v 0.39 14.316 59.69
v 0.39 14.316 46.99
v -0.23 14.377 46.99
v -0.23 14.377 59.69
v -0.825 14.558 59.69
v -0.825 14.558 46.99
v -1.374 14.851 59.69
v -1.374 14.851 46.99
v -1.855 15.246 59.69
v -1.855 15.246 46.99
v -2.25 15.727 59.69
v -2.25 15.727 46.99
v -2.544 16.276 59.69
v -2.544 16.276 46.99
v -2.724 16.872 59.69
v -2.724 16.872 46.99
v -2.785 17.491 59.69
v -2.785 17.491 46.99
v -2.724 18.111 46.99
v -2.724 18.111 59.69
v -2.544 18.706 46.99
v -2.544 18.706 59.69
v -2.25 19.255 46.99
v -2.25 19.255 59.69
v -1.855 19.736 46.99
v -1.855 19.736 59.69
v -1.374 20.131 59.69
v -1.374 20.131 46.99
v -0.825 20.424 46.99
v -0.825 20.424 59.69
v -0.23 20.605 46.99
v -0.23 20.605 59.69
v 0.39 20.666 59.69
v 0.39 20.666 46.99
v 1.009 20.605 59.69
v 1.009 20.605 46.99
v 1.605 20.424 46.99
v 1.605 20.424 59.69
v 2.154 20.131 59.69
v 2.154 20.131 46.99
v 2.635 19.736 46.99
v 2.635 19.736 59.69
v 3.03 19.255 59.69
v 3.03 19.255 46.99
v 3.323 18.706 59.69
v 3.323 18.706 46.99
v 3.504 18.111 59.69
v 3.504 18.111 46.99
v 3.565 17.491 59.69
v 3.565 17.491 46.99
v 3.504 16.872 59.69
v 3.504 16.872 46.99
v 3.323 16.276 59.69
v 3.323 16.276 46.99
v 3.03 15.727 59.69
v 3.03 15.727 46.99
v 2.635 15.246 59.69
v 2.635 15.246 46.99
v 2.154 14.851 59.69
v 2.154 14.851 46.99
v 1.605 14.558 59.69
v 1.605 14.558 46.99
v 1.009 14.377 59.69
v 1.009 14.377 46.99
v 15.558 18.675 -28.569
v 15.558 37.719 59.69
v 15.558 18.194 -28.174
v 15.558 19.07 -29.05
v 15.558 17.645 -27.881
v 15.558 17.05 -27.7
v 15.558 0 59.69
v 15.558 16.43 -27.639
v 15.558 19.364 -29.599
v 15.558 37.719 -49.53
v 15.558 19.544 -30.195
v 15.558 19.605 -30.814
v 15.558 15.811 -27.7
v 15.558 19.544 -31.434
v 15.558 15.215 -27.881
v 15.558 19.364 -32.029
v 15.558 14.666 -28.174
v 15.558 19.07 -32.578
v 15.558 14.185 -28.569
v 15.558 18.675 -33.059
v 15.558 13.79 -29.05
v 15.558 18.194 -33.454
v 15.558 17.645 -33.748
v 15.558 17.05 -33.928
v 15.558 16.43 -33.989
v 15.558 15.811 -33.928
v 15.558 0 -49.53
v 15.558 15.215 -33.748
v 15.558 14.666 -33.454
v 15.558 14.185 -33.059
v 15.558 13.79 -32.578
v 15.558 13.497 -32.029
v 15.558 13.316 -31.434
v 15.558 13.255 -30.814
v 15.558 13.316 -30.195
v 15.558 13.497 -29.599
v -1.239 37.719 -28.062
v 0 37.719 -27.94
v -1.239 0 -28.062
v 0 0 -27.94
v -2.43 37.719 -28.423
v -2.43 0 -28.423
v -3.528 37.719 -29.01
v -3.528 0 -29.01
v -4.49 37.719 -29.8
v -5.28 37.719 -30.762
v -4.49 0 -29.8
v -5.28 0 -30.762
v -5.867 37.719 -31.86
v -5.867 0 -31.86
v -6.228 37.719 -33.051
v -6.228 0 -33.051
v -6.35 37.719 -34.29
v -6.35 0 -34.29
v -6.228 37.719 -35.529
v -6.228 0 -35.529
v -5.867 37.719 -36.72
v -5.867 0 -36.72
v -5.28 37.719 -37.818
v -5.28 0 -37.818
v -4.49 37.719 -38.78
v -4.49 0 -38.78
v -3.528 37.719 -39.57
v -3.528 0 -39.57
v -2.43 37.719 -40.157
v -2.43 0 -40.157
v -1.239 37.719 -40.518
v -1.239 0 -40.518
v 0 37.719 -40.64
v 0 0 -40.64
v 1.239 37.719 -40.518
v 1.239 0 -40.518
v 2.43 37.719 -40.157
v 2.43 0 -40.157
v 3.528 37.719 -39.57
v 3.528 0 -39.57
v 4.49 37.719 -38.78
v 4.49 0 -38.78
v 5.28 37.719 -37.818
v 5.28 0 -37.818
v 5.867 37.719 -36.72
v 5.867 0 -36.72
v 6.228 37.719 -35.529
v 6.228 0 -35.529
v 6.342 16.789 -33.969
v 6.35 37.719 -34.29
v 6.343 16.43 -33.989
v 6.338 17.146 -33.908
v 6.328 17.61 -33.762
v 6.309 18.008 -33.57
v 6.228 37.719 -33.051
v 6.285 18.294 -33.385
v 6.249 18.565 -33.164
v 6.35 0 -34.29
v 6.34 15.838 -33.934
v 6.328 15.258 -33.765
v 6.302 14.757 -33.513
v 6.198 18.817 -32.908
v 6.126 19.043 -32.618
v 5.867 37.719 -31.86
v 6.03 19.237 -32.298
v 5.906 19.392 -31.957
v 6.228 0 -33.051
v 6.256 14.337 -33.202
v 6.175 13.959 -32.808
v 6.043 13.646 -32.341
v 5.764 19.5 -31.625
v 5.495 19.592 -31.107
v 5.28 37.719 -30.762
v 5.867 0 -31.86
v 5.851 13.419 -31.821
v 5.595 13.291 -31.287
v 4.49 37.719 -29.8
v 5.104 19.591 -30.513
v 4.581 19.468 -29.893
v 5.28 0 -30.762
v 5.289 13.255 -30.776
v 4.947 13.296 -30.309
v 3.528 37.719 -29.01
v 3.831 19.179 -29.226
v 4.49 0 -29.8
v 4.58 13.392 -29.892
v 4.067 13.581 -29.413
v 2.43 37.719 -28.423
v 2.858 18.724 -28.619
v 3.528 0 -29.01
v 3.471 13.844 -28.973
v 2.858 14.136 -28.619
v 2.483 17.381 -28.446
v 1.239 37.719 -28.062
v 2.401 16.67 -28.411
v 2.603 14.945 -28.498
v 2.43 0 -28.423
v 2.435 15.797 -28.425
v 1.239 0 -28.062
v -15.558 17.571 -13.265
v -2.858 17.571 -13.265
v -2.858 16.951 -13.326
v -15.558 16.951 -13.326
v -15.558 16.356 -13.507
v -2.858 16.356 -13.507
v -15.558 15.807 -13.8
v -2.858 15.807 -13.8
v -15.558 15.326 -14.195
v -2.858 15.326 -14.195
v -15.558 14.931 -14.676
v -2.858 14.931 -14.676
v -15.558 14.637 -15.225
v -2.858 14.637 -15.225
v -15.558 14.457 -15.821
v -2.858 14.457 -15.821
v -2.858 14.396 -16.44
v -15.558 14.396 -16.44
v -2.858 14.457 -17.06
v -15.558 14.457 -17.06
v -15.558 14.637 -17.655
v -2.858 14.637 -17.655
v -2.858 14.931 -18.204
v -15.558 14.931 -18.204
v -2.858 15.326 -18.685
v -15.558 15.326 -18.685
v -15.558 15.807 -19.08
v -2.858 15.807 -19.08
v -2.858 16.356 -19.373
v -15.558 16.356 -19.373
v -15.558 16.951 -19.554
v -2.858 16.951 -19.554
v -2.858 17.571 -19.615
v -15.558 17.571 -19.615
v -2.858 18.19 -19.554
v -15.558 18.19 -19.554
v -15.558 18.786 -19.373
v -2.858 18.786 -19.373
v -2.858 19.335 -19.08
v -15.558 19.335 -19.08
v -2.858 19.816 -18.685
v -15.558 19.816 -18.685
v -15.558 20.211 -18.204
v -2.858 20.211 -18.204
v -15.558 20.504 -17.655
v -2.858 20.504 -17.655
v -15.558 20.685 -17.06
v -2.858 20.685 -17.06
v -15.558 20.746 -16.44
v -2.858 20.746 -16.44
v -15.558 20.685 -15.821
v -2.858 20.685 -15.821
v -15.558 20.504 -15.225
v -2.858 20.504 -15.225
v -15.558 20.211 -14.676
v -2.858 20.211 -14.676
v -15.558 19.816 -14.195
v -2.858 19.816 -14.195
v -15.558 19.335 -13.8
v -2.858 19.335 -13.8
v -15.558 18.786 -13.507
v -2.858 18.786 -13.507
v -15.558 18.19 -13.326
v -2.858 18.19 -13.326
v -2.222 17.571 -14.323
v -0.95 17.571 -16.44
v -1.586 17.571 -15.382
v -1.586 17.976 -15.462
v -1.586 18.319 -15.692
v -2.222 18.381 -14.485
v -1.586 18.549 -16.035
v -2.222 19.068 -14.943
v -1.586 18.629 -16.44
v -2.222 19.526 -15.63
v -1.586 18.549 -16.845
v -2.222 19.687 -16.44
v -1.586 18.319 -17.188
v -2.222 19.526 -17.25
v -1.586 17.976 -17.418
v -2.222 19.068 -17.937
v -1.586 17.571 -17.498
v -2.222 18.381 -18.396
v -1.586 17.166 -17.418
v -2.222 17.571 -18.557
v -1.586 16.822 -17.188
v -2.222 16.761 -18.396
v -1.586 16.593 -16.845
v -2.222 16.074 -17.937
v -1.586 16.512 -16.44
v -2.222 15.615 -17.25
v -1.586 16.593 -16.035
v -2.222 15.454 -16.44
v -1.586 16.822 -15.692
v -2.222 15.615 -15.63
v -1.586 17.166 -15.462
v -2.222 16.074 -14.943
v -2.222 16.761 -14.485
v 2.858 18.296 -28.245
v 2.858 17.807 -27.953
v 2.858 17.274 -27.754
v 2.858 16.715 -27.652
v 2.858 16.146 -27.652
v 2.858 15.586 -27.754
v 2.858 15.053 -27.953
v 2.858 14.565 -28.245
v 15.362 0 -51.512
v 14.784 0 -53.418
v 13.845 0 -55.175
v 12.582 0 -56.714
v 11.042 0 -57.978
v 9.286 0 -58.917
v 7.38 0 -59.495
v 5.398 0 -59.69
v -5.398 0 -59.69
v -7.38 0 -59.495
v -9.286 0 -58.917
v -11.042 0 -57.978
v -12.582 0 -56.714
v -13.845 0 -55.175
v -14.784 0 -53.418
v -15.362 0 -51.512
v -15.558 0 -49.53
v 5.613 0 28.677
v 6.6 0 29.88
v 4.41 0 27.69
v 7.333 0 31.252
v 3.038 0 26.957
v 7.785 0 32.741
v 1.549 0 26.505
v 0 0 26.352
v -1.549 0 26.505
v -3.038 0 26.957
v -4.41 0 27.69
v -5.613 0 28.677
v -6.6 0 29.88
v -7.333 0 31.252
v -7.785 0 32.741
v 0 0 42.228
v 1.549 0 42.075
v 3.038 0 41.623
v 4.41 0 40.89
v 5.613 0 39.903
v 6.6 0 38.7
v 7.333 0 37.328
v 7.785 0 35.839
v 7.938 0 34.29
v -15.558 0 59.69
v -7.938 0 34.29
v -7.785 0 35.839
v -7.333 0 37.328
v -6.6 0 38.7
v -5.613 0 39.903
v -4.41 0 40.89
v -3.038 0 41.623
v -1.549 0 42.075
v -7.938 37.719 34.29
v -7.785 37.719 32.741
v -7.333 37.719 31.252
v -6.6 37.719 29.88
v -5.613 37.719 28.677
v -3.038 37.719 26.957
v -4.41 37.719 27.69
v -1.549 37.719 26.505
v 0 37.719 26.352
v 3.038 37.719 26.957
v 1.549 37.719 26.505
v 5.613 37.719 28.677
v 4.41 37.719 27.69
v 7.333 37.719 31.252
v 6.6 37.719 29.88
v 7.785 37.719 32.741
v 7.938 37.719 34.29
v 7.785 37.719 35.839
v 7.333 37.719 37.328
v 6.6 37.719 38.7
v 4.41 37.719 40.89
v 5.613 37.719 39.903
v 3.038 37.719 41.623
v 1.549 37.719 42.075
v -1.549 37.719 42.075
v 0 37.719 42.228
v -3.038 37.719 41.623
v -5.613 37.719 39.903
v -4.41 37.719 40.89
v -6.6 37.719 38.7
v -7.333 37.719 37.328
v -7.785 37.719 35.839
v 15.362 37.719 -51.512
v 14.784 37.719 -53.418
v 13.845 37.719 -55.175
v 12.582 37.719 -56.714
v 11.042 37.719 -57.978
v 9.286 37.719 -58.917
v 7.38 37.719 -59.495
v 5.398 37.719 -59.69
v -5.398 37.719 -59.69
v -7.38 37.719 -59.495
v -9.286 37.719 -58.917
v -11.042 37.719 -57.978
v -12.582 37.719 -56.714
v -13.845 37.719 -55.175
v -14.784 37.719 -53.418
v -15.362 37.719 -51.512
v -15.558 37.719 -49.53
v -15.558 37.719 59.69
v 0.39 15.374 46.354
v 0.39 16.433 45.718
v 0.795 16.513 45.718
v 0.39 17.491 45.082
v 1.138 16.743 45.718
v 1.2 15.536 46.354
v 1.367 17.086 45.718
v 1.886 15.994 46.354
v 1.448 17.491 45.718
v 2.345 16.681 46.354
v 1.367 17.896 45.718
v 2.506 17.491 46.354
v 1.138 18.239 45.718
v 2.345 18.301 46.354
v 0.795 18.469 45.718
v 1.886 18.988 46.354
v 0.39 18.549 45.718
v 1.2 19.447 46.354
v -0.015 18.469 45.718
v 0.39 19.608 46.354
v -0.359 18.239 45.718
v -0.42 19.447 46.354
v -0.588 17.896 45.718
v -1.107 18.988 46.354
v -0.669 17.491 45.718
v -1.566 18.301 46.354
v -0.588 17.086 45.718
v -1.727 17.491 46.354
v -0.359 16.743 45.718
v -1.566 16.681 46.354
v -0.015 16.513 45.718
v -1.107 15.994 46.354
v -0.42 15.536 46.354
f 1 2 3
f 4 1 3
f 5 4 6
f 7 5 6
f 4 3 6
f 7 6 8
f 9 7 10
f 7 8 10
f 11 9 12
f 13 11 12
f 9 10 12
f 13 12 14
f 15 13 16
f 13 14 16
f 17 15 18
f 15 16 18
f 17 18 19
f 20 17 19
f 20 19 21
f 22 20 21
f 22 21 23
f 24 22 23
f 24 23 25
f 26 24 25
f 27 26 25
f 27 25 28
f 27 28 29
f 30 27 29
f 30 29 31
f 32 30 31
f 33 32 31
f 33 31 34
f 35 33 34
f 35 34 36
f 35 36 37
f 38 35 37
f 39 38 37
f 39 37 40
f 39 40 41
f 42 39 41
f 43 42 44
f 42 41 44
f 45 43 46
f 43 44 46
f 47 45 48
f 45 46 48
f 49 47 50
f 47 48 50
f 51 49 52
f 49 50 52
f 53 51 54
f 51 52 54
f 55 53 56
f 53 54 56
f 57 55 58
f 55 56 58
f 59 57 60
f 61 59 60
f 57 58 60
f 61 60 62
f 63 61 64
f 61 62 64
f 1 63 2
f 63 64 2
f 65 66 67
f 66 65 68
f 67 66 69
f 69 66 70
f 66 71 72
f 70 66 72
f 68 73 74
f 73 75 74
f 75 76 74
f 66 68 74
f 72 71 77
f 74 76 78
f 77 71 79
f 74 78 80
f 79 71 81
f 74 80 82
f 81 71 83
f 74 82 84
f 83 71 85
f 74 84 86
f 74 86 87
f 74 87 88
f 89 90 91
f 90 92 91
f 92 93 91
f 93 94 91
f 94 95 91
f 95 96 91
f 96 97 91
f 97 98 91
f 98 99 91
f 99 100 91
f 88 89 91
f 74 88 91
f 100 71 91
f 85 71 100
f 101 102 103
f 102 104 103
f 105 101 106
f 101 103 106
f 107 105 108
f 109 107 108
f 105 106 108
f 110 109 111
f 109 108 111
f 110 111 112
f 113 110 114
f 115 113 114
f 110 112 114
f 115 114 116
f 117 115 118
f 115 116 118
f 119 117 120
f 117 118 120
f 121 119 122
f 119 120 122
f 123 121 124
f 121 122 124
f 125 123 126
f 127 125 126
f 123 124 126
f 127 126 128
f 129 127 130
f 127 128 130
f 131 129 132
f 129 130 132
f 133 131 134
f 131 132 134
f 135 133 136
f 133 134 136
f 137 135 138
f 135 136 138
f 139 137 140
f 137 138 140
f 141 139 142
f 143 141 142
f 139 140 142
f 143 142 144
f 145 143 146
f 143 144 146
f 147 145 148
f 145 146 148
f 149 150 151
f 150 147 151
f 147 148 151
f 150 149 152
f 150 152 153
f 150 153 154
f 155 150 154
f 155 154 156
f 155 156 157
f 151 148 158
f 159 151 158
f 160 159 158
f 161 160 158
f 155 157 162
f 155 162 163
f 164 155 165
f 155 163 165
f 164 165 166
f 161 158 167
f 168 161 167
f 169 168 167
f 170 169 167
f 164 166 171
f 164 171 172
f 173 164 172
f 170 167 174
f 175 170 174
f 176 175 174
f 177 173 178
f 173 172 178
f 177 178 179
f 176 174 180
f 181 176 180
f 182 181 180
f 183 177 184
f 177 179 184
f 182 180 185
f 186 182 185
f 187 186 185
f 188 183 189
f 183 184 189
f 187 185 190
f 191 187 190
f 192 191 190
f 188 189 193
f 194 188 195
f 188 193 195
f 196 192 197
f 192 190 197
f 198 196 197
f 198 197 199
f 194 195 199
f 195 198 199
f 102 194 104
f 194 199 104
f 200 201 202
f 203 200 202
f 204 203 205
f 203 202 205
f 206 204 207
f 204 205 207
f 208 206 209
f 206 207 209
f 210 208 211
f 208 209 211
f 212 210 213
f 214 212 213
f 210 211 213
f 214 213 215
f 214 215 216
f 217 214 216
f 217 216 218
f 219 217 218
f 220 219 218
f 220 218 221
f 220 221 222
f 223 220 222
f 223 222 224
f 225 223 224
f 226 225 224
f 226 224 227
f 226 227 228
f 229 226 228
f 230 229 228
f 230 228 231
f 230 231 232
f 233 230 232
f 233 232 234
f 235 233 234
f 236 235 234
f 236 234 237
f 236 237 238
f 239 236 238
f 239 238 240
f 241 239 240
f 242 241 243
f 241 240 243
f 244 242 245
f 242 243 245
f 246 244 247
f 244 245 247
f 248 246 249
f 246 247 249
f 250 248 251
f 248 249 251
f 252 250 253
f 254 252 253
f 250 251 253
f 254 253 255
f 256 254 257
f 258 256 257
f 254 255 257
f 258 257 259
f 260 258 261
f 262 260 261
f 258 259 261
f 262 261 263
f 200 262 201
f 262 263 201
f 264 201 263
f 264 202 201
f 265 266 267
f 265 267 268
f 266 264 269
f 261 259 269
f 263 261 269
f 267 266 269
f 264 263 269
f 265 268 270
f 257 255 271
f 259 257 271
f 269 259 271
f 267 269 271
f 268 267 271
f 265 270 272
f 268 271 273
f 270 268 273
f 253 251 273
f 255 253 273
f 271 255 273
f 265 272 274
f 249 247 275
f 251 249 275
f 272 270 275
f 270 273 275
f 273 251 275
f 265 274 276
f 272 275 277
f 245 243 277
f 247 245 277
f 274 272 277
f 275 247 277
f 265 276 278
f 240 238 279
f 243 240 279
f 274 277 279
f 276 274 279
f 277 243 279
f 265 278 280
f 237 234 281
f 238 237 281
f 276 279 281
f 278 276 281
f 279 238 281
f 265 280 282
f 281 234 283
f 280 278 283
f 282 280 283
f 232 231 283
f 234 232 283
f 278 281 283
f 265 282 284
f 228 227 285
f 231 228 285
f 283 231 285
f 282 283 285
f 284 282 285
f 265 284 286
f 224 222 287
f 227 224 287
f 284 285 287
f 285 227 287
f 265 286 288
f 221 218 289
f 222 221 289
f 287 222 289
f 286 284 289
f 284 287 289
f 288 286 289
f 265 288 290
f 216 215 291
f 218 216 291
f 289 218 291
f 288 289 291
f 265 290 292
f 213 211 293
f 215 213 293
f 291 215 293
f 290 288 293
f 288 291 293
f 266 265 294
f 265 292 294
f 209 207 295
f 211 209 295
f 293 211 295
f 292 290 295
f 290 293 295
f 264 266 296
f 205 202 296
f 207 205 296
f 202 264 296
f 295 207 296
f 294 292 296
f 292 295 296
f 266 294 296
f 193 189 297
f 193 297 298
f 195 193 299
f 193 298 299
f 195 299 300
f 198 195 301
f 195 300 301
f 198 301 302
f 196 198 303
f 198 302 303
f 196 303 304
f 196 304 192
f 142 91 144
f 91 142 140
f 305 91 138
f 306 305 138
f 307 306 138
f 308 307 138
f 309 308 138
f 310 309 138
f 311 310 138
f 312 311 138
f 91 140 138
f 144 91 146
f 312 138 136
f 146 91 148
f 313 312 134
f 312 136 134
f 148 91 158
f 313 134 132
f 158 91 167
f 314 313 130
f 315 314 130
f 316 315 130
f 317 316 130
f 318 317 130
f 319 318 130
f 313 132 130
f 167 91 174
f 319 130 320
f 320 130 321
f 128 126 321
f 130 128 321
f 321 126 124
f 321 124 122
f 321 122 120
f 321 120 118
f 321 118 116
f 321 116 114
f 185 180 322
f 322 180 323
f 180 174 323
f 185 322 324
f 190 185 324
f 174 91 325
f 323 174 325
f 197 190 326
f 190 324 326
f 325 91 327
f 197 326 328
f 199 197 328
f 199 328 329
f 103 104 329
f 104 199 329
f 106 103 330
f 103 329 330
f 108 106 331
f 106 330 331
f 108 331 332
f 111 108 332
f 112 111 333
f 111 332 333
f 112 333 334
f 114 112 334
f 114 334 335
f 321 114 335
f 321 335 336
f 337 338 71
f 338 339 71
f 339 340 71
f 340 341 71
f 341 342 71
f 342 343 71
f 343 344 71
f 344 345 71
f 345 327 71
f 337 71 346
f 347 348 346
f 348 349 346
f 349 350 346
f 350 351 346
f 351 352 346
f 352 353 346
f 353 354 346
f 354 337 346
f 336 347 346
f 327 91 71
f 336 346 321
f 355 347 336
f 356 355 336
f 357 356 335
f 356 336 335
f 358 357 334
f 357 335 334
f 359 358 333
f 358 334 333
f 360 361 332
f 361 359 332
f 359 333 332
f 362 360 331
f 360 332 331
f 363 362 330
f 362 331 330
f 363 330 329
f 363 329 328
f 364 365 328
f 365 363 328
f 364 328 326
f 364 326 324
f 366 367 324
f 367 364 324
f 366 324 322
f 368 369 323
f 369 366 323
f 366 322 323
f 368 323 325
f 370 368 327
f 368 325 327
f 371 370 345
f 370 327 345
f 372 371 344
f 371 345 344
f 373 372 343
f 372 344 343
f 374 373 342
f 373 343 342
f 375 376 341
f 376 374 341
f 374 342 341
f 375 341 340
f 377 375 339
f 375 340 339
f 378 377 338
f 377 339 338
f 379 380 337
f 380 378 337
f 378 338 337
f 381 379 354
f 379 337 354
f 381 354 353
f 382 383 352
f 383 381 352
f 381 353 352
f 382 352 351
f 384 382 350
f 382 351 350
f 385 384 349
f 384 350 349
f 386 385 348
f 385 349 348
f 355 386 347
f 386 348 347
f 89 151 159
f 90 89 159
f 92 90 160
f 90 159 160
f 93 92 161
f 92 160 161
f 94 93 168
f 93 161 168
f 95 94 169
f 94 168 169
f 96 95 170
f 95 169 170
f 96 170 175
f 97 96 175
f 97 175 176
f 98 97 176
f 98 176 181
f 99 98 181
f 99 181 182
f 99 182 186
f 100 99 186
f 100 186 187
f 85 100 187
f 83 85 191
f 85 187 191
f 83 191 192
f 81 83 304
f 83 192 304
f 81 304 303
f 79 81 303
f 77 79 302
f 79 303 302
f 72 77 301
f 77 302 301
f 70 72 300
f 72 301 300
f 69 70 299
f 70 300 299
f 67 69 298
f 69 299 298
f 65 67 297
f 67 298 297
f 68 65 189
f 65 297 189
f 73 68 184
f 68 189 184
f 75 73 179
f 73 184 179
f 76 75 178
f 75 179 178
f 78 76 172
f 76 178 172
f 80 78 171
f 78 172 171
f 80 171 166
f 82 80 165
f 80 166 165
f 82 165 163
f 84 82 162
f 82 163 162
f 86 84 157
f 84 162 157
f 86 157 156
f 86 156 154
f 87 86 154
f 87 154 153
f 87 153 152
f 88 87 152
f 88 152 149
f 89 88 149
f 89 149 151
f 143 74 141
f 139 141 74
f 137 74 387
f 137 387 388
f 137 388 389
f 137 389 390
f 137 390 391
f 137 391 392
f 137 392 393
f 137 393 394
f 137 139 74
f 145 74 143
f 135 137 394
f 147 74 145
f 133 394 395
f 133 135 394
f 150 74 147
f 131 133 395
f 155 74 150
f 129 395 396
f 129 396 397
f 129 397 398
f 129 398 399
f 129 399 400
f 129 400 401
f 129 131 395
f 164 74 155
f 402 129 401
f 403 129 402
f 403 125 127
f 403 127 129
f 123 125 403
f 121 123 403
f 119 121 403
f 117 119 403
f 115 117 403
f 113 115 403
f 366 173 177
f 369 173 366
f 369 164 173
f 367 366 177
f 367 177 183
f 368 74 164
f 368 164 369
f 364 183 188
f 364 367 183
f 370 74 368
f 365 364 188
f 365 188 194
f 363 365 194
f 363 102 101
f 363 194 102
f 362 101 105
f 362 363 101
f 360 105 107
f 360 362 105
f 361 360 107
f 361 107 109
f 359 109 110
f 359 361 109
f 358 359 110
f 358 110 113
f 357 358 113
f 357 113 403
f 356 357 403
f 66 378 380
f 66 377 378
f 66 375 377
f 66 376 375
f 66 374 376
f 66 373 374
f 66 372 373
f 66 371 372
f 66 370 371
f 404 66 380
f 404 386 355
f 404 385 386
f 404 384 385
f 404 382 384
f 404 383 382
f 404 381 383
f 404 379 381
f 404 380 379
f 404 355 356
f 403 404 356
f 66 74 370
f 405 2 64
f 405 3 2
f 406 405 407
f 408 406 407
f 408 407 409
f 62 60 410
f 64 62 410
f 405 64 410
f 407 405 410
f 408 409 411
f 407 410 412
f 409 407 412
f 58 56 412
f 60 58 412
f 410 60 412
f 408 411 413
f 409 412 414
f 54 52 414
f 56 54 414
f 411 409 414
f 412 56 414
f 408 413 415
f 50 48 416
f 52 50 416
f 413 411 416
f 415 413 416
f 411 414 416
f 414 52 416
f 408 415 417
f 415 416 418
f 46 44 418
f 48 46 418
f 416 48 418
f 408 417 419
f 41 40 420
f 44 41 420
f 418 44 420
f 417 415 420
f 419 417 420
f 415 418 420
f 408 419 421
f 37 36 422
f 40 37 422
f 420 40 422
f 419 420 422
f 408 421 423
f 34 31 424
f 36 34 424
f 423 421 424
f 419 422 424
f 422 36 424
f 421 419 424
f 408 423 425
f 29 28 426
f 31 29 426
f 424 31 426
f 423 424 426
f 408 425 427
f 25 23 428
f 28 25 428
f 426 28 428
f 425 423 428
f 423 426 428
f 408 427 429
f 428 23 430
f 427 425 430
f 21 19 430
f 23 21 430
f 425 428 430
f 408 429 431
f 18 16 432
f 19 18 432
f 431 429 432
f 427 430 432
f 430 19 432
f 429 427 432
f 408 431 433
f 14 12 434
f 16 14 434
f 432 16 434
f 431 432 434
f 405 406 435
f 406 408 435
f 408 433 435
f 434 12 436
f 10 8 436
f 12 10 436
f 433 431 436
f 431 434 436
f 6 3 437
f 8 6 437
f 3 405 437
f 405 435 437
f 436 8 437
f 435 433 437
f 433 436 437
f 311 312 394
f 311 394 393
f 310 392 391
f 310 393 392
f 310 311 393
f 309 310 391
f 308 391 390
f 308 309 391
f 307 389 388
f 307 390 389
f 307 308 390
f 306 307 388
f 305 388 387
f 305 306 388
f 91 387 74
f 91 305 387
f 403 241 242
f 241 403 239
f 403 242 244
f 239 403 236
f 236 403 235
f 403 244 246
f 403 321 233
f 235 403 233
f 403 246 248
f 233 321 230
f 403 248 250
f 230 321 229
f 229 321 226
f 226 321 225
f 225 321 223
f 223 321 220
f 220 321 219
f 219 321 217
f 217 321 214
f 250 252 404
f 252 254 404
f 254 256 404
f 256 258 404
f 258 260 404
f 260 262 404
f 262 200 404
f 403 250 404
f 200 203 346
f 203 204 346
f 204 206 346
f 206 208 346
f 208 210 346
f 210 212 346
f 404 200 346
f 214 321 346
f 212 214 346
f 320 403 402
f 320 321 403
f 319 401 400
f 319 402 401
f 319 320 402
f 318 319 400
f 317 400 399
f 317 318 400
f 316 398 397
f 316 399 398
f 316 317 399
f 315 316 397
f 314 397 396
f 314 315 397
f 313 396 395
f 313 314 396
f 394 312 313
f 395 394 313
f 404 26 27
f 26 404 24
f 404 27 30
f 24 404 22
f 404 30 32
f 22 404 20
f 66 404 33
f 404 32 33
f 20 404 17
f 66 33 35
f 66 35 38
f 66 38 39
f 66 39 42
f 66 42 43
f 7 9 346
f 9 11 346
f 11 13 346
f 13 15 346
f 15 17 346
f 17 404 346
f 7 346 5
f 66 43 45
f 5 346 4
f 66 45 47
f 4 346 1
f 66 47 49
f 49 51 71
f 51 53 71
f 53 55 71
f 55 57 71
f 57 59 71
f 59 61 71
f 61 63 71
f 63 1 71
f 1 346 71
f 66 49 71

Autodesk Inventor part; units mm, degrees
ref_plane "YZ Plane" through (0, 0, 0) normal (1, 0, 0) x (0, 1, 0)
ref_plane "XZ Plane" through (0, 0, 0) normal (0, 1, 0) x (-1, 0, 0)
ref_plane "XY Plane" through (0, 0, 0) normal (0, 0, 1) x (1, 0, 0)
sketch "Sketch1" plane through (0, 0, 0) normal (0, 1, 0) x (-1, 0, 0)
  line L0 (-5.3975, -59.69) -> (5.3975, -59.69)
  line L1 (15.5575, -49.53) -> (15.5575, 59.69)
  line L2 (15.5575, 59.69) -> (-15.5575, 59.69)
  line L3 (-15.5575, 59.69) -> (-15.5575, -49.53)
  line L4 (-15.5575, -59.69) -> (15.5575, 59.69) construction
  line L5 (15.5575, -59.69) -> (-15.5575, 59.69) construction
  arc A0 (5.3975, -59.69) -> (15.5575, -49.53) centre (5.3975, -49.53) ccw
  arc A1 (-15.5575, -49.53) -> (-5.3975, -59.69) centre (-5.3975, -49.53) ccw
  circle A2 centre (0, 34.29) radius 7.9375
  point P0 (0, 0)
  dimension "d0" = 119.38
  dimension "d1" = 31.115
  dimension "d2" = 10.16
  dimension "d3" = 15.875
  dimension "d4" = 25.4
extrude "Extrusion1" add sketch "Sketch1" along normal blind 37.719
sketch "Sketch2" plane through (0, 37.719, 0) normal (0, 1, 0) x (1, 0, 0)
  line L0 (5.3975, 59.69) -> (-5.3975, 59.69) projected
  point P0 (0, 0)
  point P1 (0, 34.29)
  dimension "d7" = 25.4
hole "Hole1" at (0, 37.719, -34.29) direction (0, -1, 0) diameter 12.7 end through all
hole "Hole3" at (0.3897, 17.4911, 59.69) direction (0, 0, -1) diameter 6.35 depth 12.7 tip angle 118
hole "Hole4" at (-15.5575, 17.5708, -16.4401) direction (1, 0, 0) diameter 6.35 depth 12.7 tip angle 118
hole "Hole5" at (15.5575, 16.4302, -30.8144) direction (-1, 0, 0) diameter 6.35 depth 12.7 tip angle 118
properties part number "Fixture_Base"
